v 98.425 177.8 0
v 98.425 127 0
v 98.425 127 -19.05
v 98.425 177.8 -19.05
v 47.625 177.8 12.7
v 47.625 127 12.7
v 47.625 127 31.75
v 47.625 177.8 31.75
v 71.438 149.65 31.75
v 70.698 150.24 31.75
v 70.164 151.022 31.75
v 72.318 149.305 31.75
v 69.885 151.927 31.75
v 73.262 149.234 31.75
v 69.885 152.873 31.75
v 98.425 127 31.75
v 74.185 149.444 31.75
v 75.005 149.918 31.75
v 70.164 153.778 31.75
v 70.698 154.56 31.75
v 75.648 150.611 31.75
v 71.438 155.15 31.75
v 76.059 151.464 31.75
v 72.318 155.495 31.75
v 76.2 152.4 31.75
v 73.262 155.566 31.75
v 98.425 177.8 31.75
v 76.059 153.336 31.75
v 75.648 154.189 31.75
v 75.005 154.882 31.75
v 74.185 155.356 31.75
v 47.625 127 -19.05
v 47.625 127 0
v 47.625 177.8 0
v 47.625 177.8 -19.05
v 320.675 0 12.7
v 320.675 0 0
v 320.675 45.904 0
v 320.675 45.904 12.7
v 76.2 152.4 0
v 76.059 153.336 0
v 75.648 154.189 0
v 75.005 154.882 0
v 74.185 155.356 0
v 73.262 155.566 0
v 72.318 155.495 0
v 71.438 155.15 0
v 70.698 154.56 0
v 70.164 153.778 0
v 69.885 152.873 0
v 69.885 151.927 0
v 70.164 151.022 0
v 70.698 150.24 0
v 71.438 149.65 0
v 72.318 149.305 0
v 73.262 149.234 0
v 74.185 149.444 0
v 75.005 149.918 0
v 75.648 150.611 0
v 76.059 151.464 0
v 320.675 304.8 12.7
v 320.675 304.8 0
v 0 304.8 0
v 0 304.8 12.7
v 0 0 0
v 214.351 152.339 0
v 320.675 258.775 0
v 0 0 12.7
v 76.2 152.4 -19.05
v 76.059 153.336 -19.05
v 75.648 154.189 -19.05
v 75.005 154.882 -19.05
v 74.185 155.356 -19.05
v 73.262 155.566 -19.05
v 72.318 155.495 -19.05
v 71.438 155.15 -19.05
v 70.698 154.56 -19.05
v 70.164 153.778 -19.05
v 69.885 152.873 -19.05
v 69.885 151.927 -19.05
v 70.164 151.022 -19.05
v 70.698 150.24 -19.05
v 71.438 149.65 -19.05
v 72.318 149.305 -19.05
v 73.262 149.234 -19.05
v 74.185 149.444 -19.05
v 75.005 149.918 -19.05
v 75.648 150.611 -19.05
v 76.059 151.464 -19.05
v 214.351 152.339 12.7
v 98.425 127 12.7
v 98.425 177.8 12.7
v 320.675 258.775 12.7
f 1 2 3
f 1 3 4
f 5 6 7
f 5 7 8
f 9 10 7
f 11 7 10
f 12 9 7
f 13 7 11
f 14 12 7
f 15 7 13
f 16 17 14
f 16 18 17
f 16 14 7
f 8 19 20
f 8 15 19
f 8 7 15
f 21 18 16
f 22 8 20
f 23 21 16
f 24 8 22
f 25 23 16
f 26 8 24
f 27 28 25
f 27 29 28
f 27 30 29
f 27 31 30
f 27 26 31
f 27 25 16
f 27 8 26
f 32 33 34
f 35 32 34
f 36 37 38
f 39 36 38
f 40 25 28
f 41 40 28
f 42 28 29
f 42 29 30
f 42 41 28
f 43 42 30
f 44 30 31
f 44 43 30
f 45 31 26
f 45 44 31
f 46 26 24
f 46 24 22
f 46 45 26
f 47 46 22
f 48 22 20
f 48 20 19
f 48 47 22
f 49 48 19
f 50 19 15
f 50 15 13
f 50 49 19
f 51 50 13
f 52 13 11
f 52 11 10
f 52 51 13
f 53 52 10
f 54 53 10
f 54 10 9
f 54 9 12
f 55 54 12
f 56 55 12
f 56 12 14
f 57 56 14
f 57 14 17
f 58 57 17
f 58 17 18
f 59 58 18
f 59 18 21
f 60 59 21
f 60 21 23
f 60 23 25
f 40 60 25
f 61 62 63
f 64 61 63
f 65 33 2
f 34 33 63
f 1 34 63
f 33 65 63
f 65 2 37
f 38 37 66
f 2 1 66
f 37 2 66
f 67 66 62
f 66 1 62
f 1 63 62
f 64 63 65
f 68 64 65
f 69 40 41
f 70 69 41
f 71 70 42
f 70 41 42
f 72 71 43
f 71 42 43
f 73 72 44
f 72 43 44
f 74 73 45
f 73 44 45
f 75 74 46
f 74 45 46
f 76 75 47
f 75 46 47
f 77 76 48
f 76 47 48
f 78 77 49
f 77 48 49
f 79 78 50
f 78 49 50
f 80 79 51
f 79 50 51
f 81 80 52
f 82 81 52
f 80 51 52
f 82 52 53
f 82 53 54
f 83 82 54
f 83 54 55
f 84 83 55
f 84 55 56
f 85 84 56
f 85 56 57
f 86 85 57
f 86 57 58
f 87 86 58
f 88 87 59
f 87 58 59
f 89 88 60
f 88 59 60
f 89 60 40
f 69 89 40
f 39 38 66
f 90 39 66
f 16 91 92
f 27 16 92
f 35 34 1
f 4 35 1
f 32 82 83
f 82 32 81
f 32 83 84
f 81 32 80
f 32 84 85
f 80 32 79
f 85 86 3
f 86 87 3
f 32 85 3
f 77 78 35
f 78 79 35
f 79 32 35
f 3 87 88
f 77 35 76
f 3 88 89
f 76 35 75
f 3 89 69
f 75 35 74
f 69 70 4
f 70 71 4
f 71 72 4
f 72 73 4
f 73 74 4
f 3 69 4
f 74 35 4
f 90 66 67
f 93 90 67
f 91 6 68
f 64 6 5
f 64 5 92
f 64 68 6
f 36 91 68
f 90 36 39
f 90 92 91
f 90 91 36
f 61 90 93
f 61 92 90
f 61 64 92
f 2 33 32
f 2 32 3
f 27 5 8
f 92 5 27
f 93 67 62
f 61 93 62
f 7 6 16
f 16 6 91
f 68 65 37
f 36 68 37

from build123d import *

# Parameters (mm, degrees)
F0_W     = 50.8
F0_H     = 50.8
F0_R     = 3.175
F1_DEPTH = 12.7
F2_DEPTH = 31.75
F3_DEPTH = 19.05


with BuildPart() as f1:
    # F0 (on Top) → F1 (new body)
    with BuildSketch(Plane.XY):
        Polygon((0, 304.8), (0, 0), (320.675, 0), (320.675, 45.903602), (214.3506, 152.339401), (320.675, 258.7752), (320.675, 304.8), align=None)
        with Locations((73.025, 152.4)):
            Rectangle(F0_W, F0_H, mode=Mode.SUBTRACT)
        with Locations((73.025, 152.4)):
            Rectangle(F0_W, F0_H)
        with Locations((73.025, 152.4)):
            Circle(F0_R, mode=Mode.SUBTRACT)
    extrude(amount=F1_DEPTH)

    # F0 (on Top) → F2 (join)
    with BuildSketch(Plane.XY):
        with Locations((73.025, 152.4)):
            Rectangle(F0_W, F0_H)
        with Locations((73.025, 152.4)):
            Circle(F0_R, mode=Mode.SUBTRACT)
    extrude(amount=F2_DEPTH)

    # F0 (on Top) → F3 (join)
    with BuildSketch(Plane.XY):
        with Locations((73.025, 152.4)):
            Rectangle(F0_W, F0_H)
        with Locations((73.025, 152.4)):
            Circle(F0_R, mode=Mode.SUBTRACT)
    extrude(amount=-F3_DEPTH)


solid = f1.part
